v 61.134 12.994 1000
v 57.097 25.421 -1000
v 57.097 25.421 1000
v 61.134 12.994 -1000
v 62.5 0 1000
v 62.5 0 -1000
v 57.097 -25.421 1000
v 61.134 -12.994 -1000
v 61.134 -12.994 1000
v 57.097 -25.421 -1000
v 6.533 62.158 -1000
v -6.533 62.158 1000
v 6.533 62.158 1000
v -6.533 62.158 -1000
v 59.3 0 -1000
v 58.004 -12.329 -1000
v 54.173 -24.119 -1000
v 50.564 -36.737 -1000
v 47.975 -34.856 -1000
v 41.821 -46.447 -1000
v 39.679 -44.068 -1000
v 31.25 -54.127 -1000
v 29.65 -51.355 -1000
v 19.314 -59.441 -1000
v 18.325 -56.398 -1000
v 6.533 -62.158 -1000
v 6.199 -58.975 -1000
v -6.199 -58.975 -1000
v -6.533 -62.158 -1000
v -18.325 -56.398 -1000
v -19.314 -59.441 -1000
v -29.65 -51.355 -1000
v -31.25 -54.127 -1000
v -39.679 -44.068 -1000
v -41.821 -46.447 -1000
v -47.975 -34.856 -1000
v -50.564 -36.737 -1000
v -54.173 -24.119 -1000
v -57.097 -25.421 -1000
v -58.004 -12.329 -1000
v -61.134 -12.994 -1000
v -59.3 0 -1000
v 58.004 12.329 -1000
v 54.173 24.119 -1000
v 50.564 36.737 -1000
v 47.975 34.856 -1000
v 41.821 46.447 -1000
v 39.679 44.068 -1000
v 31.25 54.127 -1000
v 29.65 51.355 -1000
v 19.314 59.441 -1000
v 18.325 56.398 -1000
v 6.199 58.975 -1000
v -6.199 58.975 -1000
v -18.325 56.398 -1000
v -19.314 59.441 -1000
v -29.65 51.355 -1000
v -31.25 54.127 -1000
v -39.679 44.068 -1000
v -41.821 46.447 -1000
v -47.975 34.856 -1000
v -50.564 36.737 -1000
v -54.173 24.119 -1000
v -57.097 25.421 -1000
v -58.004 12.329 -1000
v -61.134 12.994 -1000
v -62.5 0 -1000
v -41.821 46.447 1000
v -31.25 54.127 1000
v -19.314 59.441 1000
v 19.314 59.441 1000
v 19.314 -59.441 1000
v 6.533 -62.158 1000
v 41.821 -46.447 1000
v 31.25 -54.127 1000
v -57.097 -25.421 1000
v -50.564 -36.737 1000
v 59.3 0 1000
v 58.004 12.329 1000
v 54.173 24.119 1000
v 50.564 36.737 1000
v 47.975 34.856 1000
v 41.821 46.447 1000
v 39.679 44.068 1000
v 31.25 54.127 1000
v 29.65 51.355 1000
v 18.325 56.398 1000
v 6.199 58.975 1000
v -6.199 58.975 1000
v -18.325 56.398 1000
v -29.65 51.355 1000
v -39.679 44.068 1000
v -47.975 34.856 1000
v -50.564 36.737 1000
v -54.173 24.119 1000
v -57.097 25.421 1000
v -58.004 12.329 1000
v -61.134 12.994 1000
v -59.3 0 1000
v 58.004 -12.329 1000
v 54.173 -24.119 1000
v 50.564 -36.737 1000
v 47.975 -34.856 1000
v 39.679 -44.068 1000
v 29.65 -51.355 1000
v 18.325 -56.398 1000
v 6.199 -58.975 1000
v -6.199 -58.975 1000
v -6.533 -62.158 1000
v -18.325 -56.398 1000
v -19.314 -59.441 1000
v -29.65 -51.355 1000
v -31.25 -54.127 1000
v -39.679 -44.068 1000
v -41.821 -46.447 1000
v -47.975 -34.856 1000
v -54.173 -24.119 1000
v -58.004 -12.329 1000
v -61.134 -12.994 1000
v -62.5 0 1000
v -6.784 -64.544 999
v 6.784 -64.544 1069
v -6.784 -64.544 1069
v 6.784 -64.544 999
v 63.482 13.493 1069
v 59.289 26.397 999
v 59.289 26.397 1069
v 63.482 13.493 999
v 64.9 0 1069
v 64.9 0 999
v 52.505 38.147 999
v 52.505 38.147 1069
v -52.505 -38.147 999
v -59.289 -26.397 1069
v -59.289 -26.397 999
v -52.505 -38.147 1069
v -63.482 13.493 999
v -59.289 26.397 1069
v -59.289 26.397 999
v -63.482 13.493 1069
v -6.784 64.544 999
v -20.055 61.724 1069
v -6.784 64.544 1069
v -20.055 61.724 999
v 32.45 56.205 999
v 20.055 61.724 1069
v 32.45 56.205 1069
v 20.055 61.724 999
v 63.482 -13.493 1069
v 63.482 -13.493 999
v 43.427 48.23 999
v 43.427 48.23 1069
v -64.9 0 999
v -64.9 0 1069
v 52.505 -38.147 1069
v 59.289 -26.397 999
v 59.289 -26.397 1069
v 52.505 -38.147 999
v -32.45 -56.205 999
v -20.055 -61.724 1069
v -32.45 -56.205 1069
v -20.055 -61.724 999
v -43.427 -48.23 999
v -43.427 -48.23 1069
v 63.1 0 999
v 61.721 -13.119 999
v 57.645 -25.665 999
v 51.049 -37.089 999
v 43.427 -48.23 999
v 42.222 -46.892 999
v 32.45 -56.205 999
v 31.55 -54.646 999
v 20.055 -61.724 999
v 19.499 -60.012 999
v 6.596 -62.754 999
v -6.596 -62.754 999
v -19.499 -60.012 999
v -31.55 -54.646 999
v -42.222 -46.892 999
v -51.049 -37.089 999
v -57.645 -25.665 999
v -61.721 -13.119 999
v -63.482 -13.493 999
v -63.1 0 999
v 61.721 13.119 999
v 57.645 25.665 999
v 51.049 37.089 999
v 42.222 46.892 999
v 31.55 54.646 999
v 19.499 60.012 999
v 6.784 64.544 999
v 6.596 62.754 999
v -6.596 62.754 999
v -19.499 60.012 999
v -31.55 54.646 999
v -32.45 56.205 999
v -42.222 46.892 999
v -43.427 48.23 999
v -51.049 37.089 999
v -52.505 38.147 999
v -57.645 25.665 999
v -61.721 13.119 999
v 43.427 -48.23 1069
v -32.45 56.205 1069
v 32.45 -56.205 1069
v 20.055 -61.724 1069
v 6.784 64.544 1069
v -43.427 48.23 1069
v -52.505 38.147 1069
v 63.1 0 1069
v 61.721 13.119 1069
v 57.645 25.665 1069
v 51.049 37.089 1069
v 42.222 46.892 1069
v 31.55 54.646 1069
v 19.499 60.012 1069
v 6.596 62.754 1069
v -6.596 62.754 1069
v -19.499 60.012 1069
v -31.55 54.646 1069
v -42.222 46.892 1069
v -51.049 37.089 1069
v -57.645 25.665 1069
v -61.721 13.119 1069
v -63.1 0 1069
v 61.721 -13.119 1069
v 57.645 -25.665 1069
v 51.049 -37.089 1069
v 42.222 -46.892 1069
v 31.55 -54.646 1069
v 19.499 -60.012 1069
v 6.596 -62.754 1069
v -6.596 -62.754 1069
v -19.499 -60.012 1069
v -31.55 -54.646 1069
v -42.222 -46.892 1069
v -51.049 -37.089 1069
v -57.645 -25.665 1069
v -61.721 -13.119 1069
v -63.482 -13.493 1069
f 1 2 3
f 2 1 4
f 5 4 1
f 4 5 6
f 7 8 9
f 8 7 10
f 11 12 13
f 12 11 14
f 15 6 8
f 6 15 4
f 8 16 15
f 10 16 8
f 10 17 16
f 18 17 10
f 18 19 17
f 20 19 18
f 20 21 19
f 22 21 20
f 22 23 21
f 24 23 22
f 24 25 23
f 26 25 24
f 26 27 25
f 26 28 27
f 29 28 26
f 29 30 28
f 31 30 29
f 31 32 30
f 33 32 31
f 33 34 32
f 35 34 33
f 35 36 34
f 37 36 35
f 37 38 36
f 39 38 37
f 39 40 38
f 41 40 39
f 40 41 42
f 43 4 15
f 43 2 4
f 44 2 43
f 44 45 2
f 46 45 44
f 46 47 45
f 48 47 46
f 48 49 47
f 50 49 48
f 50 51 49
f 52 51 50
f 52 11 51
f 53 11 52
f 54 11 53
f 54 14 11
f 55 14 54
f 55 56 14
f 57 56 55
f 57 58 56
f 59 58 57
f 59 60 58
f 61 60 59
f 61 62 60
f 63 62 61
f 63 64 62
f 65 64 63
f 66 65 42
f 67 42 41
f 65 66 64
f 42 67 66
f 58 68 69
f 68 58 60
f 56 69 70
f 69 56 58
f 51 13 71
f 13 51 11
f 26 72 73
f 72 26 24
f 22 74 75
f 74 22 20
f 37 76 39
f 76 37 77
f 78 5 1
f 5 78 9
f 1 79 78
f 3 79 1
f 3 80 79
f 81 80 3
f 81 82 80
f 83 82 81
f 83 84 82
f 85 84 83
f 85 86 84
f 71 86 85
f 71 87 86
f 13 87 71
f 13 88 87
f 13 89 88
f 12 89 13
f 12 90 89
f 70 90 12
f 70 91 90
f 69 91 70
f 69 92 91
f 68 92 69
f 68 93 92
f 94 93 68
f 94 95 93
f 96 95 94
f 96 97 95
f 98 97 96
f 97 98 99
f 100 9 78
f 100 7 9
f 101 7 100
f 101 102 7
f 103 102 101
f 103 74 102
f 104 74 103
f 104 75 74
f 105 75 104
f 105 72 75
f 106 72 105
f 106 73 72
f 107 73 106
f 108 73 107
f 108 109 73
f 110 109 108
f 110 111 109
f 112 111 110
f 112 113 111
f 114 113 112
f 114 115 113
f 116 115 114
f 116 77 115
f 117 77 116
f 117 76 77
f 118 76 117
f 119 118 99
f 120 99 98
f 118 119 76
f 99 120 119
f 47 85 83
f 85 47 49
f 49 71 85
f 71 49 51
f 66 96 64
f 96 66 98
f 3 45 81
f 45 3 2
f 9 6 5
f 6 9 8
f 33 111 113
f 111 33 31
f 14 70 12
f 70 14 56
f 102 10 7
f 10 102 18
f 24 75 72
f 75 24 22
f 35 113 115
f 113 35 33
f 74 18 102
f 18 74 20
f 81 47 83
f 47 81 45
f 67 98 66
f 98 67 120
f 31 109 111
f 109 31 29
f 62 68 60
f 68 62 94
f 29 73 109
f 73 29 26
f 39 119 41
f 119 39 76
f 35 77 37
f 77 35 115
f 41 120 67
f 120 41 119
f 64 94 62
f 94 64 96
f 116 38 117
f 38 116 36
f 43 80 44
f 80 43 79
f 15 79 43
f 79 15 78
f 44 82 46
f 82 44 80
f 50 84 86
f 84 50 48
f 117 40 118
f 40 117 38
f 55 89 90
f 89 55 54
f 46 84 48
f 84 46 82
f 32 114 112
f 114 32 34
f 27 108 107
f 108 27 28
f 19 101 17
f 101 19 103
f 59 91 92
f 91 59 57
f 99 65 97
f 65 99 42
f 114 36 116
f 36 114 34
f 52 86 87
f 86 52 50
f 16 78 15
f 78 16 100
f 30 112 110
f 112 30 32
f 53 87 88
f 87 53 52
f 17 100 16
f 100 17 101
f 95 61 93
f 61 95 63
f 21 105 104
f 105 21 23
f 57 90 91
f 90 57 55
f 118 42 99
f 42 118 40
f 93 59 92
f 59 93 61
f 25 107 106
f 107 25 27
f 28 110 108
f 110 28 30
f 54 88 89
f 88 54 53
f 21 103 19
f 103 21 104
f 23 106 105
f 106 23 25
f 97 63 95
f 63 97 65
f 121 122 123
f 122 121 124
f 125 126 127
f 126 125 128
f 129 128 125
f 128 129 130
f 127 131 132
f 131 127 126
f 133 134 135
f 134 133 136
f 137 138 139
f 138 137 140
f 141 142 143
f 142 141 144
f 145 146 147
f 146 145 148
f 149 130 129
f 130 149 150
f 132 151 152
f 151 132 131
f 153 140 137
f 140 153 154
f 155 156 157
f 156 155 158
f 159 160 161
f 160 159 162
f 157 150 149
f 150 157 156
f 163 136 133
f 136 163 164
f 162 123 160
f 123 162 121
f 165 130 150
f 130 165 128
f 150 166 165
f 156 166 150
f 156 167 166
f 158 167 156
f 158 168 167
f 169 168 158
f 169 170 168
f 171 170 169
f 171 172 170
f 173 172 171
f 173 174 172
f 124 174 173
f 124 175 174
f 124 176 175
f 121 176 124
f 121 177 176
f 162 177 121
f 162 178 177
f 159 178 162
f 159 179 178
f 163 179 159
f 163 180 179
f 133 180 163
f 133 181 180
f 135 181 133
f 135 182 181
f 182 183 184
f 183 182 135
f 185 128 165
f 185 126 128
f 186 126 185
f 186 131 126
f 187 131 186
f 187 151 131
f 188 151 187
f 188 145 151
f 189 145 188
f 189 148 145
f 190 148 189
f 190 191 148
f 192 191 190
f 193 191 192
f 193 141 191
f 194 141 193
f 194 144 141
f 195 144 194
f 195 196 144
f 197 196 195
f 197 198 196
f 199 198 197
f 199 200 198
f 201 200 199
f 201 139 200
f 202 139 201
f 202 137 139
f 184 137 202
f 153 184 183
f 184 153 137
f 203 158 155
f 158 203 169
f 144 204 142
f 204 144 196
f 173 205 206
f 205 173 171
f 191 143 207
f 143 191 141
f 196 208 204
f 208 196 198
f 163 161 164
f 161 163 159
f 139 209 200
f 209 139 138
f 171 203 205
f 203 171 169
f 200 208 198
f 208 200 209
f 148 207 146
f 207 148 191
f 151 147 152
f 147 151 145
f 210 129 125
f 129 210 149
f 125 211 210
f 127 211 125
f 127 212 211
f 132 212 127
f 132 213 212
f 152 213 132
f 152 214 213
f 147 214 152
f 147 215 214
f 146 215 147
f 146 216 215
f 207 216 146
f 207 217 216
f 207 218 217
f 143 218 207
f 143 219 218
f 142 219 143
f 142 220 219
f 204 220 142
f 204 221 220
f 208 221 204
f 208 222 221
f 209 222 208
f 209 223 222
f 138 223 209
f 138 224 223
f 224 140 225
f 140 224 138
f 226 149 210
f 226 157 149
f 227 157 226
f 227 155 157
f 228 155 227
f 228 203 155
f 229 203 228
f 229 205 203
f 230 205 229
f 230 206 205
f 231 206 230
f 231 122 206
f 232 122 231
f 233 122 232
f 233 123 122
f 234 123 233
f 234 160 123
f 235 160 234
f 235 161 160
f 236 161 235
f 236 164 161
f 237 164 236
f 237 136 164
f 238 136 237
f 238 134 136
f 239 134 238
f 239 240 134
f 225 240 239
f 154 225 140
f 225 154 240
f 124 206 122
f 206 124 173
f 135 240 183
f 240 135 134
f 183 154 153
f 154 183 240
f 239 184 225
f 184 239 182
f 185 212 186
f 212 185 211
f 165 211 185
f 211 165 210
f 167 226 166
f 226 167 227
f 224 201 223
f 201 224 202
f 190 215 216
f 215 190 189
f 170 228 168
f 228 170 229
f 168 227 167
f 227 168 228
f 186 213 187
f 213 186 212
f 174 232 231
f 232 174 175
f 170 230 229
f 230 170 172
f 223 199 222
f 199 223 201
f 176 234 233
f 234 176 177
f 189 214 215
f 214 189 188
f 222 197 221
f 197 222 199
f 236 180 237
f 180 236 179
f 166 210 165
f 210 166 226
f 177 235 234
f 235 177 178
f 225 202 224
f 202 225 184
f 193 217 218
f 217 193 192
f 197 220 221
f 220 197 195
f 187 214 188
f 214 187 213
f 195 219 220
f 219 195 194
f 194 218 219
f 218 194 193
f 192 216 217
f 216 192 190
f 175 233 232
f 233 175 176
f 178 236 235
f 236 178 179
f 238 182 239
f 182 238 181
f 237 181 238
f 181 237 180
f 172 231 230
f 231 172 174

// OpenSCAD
// Parameters
pipe_standard = 0; //[0:0:1]
nominal_diameter_mm = 125; //[60:250:1]
length_mm = 2000; //[1000:4000:10]
pipe_od = 125; //[60:250:1]
pipe_wall = 3.2; //[1.6:6.4:0.1]
socket_length = 70; //[35:140:1]
socket_wall_extra = 1.8; //[0.8:4:0.1]
socket_clearance = 0.6; //[0.2:1.5:0.1]
connect_overlap = 1; //[0.5:2:0.1]

// HT Pipe - complete geometry
module ht_pipe() {
  color([0.85, 0.85, 0.8]) {
    // Pipe Body
    difference() {
      cylinder(h=length_mm, r=pipe_od/2, center=true);
      translate([0, 0, 0])
        cylinder(h=length_mm + 2*connect_overlap, r=pipe_od/2 - pipe_wall, center=true);
    }
    
    // End Fitting Socket
    difference() {
      translate([0, 0, length_mm/2 + socket_length/2 - connect_overlap])
        cylinder(h=socket_length, r=pipe_od/2 + socket_clearance + socket_wall_extra, center=true);
      translate([0, 0, length_mm/2 + socket_length/2 - connect_overlap])
        cylinder(h=socket_length + 2*connect_overlap, r=pipe_od/2 + socket_clearance, center=true);
    }
  }
}

// Assembly
module assembly() {
  ht_pipe();
}

assembly();
